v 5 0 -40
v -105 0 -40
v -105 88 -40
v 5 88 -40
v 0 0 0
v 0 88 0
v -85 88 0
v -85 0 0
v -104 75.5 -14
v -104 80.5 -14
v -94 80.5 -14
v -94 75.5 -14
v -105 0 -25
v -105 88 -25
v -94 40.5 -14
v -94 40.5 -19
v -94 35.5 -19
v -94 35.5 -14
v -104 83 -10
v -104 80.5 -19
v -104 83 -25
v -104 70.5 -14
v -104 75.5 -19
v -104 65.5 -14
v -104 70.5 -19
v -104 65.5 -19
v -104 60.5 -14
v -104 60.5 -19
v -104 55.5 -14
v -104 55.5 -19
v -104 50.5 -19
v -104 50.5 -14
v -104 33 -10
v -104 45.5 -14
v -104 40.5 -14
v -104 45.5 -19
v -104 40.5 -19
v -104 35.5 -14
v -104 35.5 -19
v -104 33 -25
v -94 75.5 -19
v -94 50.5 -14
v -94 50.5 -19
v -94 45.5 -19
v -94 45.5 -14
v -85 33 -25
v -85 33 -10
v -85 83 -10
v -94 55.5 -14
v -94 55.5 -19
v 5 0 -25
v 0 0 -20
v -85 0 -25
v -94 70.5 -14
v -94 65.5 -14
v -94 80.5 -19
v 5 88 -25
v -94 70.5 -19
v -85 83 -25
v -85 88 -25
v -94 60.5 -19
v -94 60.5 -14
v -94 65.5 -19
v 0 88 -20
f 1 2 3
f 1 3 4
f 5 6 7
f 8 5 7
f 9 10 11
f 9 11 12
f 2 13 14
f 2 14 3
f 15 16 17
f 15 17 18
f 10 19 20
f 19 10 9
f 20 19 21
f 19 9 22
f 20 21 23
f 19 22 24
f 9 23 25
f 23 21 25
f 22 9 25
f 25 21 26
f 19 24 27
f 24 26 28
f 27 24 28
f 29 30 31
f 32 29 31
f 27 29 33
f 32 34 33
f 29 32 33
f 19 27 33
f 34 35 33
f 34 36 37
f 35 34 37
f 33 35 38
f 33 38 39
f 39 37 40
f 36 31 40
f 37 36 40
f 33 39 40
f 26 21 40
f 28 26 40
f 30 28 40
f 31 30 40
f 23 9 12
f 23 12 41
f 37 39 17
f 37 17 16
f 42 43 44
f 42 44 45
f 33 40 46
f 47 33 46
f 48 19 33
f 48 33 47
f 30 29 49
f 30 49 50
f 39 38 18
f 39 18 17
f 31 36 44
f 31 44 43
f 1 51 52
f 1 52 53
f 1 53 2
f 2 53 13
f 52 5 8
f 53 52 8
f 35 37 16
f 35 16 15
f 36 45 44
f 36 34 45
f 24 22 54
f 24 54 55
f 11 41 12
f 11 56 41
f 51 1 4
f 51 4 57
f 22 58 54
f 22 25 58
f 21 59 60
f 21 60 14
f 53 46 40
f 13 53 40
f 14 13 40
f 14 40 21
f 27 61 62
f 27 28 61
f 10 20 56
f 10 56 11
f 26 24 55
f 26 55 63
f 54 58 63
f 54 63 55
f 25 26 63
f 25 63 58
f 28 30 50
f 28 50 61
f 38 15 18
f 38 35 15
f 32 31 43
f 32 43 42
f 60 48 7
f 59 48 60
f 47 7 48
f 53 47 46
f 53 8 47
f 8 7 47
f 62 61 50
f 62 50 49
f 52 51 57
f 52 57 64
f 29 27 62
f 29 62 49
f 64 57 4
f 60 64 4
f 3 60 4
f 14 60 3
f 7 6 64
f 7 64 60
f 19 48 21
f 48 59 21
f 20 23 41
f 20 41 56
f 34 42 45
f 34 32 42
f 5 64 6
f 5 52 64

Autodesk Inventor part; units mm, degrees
ref_plane "YZ Plane" through (0, 0, 0) normal (1, 0, 0) x (0, 1, 0)
ref_plane "XZ Plane" through (0, 0, 0) normal (0, 1, 0) x (-1, 0, 0)
ref_plane "XY Plane" through (0, 0, 0) normal (0, 0, 1) x (1, 0, 0)
sketch "Sketch2" plane through (0, 0, 0) normal (0, 1, 0) x (-1, 0, 0)
  line L0 (0, 0) -> (85, 0)
  line L1 (85, 0) -> (85, -25)
  line L2 (85, -25) -> (0, -25)
  line L3 (0, -25) -> (0, 0)
  line L4 (-5, -25) -> (105, -25)
  line L5 (105, -25) -> (105, -40)
  line L6 (105, -40) -> (-5, -40)
  line L7 (-5, -40) -> (-5, -25)
  line L8 (-5, -25) -> (0, -20)
  dimension "d4" = 85
  dimension "d5" = 25
  dimension "d6" = 110
  dimension "d7" = 5
  dimension "d8" = 15
  dimension "d9" = 45
extrude "Extrusion2" add sketch "Sketch2" along normal blind 88
sketch "Sketch3" plane through (-105, 0, -25) normal (0, 0, 1) x (1, 0, 0)
  line L0 (20, 0) -> (20, 88) projected
  line L1 (20, 83) -> (1, 83)
  line L2 (1, 83) -> (1, 33)
  line L3 (1, 33) -> (20, 33)
  line L4 (20, 33) -> (20, 83)
  line L5 (0, 88) -> (20, 88) projected
  point P0 (105, 0)
  point P1 (20, 33)
  dimension "d12" = 50
  dimension "d13" = 19
  dimension "d14" = 5
extrude "Extrusion3" add sketch "Sketch3" along normal blind 15
sketch "Sketch4" plane through (-104, 33, -25) normal (-1, 0, 0) x (0, 0, 1)
  line L0 (6, 7.5) -> (11, 7.5)
  line L1 (11, 7.5) -> (11, 2.5)
  line L2 (11, 2.5) -> (6, 2.5)
  line L3 (6, 2.5) -> (6, 7.5)
  line L4 (0, -33) -> (0, 55) projected
  line L5 (0, 0) -> (15, 0) projected
  line L6 (6, 17.5) -> (11, 17.5)
  line L7 (11, 17.5) -> (11, 12.5)
  line L8 (6, 12.5) -> (6, 17.5)
  line L9 (11, 12.5) -> (6, 12.5)
  line L10 (6, 27.5) -> (11, 27.5)
  line L11 (11, 27.5) -> (11, 22.5)
  line L12 (6, 22.5) -> (6, 27.5)
  line L13 (11, 22.5) -> (6, 22.5)
  line L14 (6, 37.5) -> (11, 37.5)
  line L15 (11, 37.5) -> (11, 32.5)
  line L16 (6, 32.5) -> (6, 37.5)
  line L17 (11, 32.5) -> (6, 32.5)
  line L18 (6, 47.5) -> (11, 47.5)
  line L19 (11, 47.5) -> (11, 42.5)
  line L20 (6, 42.5) -> (6, 47.5)
  line L21 (11, 42.5) -> (6, 42.5)
  point P0 (25, -33)
  point P1 (6, 5)
  point P2 (7.5, 0)
  point P3 (8.5, 2.5)
  point P4 (6, 15)
  point P5 (8.5, 12.5)
  point P6 (6, 25)
  point P7 (8.5, 22.5)
  point P8 (6, 35)
  point P9 (8.5, 32.5)
  point P10 (6, 45)
  point P11 (8.5, 42.5)
  dimension "d17" = 6
  dimension "d18" = 5
  dimension "d19" = 2.5
  dimension "d20" = 5
  dimension "d23" = 10
extrude "Extrusion4" cut sketch "Sketch4" against normal blind 10
properties part number "PowerSupply"
